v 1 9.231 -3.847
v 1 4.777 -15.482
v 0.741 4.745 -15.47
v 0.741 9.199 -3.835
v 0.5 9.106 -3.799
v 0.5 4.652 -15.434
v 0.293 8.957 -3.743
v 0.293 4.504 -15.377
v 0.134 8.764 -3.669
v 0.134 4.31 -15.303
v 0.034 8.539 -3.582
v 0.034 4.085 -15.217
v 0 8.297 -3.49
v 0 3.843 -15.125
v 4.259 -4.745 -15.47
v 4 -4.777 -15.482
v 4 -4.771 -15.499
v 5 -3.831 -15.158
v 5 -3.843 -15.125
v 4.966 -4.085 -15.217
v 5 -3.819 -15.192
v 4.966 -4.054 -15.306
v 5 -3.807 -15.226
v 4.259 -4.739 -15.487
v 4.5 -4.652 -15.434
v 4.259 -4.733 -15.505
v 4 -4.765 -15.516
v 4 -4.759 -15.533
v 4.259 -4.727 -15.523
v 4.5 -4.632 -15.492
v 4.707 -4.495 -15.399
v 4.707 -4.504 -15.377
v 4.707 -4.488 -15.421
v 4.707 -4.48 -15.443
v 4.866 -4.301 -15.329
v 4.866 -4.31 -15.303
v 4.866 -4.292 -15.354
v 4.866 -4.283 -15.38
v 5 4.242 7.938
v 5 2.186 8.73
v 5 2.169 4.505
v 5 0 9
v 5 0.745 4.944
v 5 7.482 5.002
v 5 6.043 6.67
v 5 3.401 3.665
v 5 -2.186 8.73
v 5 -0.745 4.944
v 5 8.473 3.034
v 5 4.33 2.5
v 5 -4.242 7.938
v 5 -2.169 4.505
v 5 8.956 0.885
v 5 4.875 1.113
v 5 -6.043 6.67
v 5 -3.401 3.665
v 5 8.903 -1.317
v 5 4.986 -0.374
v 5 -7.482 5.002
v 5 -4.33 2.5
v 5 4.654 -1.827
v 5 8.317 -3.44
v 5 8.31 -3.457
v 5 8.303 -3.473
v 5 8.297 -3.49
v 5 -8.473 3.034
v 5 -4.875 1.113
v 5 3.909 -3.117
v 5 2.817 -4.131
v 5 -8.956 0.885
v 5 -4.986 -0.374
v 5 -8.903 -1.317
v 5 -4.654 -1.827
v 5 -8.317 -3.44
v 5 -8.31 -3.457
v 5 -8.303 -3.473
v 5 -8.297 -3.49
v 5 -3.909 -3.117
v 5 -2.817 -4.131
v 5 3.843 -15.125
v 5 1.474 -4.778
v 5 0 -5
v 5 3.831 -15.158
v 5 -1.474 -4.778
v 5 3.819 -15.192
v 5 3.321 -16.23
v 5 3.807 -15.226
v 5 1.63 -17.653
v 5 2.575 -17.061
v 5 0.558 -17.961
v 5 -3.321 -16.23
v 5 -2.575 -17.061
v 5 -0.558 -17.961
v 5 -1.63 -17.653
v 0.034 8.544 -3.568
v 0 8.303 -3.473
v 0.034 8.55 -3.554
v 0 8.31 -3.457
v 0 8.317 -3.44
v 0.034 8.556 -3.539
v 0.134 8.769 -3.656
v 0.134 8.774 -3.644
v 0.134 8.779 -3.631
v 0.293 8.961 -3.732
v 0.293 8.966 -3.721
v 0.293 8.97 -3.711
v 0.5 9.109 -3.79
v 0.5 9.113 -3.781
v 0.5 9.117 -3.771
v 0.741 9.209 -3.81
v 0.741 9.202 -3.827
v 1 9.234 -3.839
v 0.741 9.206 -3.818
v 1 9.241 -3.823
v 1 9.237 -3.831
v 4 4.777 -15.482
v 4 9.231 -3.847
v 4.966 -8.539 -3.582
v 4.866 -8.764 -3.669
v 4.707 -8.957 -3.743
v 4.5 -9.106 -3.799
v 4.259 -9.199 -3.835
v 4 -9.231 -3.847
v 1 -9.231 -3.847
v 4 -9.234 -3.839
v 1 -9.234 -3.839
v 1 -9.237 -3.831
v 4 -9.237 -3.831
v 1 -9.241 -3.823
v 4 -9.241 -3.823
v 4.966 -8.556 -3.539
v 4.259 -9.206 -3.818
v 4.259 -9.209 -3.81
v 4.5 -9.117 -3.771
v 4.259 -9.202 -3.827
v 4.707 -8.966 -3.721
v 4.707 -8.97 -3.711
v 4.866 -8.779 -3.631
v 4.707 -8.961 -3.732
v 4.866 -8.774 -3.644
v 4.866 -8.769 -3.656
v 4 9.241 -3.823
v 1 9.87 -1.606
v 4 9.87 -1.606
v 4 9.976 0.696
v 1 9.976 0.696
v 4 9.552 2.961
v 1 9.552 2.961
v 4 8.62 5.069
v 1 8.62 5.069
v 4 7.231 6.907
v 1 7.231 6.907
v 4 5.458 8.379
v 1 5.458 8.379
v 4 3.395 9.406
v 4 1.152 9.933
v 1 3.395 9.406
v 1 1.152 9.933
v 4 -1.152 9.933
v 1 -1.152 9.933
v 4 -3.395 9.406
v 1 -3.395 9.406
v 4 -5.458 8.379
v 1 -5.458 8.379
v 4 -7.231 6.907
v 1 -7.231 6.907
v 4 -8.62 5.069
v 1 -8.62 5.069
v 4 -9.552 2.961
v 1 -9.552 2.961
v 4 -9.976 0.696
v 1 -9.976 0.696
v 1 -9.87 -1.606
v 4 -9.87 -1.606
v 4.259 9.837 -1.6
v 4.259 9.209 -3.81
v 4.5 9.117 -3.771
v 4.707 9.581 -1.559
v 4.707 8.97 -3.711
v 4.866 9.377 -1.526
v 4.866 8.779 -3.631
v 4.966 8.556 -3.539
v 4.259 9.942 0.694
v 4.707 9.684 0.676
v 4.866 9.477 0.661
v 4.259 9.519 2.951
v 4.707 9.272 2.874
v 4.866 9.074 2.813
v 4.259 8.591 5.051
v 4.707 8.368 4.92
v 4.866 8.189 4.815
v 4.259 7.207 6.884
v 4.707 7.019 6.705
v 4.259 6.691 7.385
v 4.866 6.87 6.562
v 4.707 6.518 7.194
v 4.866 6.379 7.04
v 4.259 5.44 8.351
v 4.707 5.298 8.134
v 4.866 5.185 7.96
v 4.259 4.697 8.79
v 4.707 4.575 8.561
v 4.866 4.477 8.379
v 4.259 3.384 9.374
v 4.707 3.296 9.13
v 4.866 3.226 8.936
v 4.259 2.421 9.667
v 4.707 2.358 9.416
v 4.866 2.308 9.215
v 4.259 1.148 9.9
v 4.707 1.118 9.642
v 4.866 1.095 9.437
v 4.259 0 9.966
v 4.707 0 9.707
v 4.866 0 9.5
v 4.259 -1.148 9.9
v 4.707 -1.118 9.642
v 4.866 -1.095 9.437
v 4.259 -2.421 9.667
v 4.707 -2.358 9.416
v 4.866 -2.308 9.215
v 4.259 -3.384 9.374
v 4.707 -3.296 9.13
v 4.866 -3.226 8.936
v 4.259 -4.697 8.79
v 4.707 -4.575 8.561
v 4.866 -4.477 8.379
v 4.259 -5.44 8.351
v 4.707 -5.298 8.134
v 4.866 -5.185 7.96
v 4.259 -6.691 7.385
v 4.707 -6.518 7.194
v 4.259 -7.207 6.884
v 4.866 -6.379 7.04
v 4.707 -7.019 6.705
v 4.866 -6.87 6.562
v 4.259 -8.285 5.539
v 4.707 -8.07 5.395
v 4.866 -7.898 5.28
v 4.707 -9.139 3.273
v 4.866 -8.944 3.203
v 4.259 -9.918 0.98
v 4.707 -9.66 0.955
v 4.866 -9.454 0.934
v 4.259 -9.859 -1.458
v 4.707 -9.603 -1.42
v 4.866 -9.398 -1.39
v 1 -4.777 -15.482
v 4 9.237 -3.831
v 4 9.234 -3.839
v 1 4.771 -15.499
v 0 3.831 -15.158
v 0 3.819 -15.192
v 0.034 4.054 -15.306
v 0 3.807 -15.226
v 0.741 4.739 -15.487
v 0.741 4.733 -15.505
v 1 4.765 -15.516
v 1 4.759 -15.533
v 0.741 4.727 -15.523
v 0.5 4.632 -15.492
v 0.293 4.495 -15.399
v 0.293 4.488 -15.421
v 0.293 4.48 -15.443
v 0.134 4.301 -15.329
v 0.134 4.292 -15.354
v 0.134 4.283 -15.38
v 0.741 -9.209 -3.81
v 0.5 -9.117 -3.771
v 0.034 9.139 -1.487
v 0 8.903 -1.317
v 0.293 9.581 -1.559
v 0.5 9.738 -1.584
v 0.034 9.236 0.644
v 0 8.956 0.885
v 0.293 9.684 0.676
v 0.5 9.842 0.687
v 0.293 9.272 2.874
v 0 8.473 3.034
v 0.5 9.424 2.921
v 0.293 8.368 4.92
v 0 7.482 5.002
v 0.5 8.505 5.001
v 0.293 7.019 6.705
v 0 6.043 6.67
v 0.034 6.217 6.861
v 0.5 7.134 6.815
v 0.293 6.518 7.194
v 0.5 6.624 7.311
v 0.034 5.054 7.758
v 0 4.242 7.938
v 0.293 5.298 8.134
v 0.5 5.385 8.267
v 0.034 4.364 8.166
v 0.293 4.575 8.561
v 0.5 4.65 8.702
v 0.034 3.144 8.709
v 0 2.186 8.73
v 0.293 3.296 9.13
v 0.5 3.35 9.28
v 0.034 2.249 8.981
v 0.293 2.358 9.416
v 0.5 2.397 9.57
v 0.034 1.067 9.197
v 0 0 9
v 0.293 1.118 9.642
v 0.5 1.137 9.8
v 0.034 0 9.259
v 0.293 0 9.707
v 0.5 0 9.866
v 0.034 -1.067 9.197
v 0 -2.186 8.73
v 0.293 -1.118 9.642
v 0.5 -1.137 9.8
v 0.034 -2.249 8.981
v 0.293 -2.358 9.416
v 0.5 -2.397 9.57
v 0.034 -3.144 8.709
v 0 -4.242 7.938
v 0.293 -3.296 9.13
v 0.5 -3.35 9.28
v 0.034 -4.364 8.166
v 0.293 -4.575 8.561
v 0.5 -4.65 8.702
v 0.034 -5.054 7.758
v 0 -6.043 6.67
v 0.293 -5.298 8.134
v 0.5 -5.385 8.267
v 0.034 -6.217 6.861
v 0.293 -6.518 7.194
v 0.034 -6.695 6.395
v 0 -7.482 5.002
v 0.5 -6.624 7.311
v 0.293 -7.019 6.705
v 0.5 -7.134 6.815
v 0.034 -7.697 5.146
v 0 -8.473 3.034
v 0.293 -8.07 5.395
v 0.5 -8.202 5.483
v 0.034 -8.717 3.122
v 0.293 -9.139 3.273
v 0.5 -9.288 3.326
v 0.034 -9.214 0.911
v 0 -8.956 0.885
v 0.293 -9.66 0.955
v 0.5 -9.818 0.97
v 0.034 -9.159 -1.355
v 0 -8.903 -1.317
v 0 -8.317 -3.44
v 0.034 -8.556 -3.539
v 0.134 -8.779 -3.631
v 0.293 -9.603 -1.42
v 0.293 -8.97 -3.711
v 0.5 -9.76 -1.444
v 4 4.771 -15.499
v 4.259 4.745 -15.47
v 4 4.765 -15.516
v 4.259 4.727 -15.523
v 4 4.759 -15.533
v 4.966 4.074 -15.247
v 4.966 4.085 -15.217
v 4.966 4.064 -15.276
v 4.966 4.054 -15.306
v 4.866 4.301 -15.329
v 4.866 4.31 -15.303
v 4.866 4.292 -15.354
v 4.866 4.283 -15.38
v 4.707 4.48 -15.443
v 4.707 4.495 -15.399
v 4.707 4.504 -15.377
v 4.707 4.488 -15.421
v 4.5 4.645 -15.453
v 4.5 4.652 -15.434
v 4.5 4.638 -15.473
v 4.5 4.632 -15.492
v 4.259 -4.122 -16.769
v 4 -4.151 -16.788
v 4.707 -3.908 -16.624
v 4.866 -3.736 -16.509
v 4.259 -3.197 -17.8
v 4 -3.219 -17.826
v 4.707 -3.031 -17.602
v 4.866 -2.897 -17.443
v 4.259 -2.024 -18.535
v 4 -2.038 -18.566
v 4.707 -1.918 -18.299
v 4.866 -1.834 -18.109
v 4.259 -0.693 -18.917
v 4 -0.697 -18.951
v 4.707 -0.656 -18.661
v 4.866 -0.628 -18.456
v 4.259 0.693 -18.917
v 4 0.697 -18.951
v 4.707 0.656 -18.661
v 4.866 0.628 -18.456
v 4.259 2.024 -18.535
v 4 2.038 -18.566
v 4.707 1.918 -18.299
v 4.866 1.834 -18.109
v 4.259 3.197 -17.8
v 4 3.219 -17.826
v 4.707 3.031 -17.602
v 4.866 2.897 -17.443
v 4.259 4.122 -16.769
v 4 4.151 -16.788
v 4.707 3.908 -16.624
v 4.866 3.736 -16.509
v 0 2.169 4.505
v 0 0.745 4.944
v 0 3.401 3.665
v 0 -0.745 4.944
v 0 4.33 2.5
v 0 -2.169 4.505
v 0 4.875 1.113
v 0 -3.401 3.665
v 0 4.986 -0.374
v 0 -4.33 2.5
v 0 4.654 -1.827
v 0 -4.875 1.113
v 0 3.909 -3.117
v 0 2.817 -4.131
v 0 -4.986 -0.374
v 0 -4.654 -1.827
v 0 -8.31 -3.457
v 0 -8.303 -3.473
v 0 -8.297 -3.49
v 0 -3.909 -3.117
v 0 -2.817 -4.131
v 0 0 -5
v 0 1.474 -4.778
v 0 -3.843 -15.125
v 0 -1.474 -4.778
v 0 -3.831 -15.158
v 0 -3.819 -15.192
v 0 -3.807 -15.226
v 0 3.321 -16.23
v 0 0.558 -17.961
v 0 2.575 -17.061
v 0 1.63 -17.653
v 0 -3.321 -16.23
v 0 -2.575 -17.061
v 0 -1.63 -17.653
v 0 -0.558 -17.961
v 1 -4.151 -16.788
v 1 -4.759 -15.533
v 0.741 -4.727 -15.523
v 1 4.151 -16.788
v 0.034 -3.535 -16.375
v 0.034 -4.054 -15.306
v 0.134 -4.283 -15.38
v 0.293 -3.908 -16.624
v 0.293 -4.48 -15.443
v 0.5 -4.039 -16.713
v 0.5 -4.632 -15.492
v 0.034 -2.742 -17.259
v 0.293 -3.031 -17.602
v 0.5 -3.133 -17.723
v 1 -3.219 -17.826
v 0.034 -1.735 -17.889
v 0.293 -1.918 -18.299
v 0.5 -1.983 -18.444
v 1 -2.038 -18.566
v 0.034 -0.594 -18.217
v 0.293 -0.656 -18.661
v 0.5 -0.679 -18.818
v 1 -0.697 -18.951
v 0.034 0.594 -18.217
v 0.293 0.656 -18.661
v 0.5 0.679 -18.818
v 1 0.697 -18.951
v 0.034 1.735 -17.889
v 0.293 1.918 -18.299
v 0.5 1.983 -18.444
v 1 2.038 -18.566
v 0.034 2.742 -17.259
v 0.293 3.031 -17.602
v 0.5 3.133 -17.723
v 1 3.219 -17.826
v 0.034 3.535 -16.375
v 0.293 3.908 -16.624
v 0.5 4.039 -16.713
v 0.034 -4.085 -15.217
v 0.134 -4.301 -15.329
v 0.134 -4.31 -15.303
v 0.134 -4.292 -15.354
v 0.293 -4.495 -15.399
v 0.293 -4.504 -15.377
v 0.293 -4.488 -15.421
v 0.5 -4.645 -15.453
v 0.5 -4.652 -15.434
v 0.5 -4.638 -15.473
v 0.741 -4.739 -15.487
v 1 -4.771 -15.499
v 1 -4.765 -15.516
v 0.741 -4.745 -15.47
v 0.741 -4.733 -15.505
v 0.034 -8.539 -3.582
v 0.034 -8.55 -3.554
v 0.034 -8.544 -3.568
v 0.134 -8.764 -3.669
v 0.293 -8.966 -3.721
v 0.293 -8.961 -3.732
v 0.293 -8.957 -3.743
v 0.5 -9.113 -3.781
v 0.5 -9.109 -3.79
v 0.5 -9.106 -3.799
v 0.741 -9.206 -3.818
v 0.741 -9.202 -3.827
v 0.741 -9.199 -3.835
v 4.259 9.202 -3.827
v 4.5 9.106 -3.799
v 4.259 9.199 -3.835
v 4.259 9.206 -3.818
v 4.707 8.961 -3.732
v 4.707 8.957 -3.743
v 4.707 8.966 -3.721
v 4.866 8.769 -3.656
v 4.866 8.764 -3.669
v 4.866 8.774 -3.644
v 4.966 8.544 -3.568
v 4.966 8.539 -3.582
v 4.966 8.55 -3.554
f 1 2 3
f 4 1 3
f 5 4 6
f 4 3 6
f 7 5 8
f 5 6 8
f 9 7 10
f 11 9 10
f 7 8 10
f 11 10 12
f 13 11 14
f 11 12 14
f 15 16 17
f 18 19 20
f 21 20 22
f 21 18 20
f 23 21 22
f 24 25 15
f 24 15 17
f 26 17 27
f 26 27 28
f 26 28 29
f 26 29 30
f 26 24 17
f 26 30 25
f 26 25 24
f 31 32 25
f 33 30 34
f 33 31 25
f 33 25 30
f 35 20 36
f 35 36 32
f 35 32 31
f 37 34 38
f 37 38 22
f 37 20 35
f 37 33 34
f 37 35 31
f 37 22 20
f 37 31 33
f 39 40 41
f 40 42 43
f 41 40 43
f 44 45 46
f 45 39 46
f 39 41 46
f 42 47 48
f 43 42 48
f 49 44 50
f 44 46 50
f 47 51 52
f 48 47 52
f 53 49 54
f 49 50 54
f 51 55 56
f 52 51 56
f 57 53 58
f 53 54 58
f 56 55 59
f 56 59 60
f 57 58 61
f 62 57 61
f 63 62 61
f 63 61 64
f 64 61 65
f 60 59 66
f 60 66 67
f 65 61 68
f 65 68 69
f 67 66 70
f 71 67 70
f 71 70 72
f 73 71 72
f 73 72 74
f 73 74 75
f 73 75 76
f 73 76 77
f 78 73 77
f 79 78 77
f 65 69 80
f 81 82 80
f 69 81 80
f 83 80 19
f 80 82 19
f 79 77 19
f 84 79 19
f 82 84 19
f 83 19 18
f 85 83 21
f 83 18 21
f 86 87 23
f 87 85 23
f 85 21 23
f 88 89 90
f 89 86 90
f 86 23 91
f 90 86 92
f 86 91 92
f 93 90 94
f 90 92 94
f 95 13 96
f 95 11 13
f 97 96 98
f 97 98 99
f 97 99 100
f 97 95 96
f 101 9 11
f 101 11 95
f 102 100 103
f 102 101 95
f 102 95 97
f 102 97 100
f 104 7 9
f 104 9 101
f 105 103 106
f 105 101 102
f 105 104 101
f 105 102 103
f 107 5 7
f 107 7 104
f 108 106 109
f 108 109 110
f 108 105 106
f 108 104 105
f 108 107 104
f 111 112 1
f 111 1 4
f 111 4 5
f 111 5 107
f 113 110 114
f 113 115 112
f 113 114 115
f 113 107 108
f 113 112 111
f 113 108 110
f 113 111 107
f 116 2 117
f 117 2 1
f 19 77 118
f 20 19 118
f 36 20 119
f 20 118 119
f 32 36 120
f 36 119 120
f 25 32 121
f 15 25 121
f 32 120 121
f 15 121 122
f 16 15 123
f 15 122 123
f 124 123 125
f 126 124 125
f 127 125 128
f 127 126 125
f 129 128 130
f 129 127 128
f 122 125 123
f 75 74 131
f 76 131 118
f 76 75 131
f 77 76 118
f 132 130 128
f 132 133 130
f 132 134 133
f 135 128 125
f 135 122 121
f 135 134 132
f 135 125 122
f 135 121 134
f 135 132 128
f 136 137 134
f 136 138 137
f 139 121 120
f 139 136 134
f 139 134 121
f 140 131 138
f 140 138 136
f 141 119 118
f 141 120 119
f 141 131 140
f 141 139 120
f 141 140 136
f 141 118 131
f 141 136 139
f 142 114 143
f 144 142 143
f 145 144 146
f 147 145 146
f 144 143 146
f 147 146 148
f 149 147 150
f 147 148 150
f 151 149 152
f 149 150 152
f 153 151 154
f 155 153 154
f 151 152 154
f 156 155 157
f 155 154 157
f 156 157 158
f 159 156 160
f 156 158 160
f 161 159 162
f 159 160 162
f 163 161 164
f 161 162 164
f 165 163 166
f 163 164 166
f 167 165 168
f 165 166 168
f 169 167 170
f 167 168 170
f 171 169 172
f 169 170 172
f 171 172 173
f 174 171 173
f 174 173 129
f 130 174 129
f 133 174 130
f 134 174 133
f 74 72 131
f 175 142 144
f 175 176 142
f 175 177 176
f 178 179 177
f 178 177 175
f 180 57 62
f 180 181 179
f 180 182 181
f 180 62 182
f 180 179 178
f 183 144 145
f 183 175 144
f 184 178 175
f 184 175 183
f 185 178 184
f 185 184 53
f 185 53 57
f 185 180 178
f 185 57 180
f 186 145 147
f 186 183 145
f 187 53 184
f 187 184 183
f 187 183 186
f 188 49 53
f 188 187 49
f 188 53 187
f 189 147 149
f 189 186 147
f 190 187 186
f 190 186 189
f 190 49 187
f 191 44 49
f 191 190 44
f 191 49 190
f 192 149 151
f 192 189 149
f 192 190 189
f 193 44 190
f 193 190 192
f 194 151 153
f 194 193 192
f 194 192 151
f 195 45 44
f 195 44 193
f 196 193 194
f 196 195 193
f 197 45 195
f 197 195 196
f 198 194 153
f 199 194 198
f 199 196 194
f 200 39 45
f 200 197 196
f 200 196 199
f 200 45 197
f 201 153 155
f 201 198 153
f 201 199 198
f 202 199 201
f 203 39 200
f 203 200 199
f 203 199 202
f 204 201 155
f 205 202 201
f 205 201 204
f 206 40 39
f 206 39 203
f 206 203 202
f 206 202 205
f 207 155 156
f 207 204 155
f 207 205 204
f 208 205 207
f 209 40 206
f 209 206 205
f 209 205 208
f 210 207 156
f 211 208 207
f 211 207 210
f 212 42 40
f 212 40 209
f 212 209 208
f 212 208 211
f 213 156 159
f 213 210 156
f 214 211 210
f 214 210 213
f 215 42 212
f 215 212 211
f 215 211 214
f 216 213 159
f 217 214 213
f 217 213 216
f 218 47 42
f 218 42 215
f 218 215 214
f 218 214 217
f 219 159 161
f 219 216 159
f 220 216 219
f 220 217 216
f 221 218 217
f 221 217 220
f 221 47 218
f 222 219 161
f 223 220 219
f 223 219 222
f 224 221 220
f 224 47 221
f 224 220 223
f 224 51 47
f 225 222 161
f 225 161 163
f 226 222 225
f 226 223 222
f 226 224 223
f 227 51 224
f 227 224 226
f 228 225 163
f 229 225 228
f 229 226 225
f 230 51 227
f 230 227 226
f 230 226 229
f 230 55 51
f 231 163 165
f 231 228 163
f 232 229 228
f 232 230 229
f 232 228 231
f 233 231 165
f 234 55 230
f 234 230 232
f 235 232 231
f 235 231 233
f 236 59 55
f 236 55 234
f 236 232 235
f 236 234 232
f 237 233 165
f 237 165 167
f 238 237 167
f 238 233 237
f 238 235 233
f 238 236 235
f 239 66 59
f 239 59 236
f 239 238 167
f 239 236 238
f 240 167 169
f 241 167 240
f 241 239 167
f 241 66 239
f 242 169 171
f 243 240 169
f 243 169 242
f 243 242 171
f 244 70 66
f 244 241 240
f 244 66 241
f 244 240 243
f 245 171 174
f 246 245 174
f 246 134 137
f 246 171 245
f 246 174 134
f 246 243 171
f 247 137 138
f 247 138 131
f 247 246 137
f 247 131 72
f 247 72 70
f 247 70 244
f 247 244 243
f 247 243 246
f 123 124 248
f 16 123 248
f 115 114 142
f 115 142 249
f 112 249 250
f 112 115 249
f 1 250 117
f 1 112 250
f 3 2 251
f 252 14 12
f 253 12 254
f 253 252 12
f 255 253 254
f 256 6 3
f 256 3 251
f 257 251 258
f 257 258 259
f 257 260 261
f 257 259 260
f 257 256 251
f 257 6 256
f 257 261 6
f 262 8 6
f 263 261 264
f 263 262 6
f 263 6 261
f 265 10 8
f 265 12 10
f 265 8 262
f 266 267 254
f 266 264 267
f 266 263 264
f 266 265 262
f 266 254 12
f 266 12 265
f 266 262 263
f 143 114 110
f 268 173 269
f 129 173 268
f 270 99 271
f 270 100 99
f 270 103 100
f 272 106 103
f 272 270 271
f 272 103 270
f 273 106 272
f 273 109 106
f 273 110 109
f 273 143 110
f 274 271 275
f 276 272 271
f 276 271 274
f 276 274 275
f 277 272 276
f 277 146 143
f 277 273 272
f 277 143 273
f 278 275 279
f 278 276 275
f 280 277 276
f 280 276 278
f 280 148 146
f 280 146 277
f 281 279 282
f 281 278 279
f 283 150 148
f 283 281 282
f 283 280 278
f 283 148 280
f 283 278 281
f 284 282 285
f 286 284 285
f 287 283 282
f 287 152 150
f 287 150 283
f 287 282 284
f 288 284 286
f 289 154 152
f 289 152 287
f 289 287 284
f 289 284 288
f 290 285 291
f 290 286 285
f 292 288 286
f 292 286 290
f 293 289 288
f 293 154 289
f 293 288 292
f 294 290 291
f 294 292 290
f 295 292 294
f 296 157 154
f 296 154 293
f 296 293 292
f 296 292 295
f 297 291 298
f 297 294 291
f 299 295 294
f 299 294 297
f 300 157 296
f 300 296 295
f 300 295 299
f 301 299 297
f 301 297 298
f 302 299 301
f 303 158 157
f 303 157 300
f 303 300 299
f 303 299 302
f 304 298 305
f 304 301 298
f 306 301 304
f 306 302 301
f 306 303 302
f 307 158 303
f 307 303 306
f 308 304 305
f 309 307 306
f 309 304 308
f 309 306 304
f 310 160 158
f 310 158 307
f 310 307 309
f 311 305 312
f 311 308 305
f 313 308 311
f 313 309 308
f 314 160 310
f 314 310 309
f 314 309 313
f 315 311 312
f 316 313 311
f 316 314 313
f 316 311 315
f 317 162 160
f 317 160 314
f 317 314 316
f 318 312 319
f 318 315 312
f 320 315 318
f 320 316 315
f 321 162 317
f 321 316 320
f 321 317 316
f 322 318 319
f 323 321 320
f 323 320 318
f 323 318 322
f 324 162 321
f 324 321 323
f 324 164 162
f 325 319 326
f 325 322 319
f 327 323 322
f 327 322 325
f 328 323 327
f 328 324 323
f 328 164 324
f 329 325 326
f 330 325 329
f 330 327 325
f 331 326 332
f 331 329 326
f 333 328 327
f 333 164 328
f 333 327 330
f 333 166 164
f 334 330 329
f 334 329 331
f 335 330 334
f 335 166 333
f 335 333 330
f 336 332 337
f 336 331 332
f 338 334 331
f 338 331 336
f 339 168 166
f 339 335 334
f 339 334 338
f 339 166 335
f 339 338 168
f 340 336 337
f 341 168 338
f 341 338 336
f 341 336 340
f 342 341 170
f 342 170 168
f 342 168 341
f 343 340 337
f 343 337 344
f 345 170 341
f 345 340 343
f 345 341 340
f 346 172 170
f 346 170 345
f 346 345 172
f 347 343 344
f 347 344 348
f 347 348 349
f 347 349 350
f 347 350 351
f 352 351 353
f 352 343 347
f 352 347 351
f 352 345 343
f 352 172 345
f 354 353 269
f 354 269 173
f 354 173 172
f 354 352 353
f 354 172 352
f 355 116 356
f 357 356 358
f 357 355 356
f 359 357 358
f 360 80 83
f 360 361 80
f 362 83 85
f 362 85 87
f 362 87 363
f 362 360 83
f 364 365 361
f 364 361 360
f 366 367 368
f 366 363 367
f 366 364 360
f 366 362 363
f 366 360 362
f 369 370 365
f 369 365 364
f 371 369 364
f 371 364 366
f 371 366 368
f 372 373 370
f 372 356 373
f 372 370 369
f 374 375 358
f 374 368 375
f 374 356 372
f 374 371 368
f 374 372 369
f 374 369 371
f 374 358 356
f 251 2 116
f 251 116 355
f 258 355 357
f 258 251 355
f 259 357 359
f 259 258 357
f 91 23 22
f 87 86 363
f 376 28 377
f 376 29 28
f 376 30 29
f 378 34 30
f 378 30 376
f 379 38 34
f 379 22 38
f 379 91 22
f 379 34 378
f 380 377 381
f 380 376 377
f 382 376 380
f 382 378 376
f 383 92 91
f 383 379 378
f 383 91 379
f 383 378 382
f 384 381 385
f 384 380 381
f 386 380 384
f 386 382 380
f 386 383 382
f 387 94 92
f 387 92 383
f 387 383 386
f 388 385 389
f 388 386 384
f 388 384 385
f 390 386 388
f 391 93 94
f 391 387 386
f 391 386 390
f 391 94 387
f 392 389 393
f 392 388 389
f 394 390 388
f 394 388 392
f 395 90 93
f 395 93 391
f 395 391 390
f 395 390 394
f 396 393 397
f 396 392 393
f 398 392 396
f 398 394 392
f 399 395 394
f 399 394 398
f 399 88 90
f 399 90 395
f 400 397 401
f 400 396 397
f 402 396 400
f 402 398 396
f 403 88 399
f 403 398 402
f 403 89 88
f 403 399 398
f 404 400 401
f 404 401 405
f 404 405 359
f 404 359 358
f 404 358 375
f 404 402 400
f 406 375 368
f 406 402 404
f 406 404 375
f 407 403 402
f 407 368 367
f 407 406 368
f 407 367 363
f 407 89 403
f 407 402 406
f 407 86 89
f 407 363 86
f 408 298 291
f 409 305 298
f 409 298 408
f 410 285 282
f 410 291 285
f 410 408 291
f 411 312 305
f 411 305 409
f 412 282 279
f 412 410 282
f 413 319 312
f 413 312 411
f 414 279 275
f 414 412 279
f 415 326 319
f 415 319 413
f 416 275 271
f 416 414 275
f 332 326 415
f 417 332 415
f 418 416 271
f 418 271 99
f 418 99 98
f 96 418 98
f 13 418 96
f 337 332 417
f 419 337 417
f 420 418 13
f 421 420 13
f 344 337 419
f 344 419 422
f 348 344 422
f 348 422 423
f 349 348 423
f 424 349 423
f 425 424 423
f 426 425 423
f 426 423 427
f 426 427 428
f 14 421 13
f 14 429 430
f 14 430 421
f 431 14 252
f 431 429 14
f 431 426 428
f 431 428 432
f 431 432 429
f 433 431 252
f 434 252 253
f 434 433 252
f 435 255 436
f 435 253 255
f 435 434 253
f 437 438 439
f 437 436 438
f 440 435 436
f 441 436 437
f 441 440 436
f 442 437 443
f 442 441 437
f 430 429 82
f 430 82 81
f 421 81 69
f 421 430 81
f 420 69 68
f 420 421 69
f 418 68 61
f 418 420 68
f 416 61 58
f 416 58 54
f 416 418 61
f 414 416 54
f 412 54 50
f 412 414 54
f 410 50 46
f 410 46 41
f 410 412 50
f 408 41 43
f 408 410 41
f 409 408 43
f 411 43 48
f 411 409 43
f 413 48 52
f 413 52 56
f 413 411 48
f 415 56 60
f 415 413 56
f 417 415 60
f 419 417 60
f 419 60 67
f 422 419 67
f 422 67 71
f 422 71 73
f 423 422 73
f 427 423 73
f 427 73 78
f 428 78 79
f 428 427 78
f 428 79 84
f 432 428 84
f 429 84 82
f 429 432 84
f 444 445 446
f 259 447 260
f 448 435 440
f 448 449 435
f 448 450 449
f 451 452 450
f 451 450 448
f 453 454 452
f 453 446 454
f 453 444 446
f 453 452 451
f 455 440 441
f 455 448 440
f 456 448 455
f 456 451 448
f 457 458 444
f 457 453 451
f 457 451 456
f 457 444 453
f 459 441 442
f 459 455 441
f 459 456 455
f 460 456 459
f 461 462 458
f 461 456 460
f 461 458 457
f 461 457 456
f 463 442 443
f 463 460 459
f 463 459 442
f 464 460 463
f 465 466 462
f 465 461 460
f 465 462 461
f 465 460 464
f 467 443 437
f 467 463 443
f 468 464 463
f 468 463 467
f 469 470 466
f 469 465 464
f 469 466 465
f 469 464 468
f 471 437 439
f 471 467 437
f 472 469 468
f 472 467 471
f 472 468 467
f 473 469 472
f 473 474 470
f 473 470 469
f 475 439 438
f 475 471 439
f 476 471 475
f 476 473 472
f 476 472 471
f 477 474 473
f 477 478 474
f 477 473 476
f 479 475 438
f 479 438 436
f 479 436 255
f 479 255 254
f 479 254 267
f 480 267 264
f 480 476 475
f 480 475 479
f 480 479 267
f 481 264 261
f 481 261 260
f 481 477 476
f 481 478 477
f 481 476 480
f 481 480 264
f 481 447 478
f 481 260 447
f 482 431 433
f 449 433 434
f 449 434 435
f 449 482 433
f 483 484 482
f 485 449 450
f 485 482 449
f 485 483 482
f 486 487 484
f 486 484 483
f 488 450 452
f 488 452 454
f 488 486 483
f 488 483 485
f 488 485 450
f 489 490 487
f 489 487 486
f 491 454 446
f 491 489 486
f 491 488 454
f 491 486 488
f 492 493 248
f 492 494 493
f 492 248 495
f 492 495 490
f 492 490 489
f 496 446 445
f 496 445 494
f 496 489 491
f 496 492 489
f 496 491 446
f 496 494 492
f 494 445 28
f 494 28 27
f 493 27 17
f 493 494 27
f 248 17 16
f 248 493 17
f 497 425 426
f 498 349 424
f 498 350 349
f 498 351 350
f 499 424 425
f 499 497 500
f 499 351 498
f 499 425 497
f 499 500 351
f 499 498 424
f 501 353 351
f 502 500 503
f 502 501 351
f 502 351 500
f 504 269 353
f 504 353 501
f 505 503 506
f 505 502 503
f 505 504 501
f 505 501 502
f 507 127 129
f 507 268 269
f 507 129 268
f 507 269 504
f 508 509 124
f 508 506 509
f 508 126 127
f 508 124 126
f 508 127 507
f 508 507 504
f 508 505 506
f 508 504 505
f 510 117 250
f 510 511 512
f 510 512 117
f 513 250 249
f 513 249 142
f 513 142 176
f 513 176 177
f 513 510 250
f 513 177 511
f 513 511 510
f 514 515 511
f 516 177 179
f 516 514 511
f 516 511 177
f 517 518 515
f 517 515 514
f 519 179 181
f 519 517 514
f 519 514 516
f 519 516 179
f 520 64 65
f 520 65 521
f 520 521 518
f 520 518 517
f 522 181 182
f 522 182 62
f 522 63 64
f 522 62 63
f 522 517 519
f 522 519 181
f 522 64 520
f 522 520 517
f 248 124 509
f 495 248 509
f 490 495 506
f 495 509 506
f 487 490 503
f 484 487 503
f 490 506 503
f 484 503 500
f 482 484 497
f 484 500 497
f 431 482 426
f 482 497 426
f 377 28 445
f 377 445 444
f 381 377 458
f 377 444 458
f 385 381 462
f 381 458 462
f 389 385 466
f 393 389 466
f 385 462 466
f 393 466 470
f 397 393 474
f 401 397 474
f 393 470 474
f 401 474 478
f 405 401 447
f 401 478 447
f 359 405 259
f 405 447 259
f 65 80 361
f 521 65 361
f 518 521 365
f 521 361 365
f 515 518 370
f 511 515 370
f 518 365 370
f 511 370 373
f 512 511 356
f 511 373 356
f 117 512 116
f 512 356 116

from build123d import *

# Parameters (mm, degrees)
SKETCH1_R           = 5
BOSS_EXTRUDE1_DEPTH = 5
FILLET2_R           = 1


with BuildPart() as part:
    # Sketch1 → Boss-Extrude1 (new body)
    with BuildSketch(Plane(origin=(0, 0, 0), x_dir=(0, 0, -1), z_dir=(1, 0, 0))):
        with BuildLine():
            Line((3.834545484, -9.235597487), (15.508521108, -4.767007874))
            ThreePointArc((15.508521108, -4.767007874), (19, 0), (15.508521108, 4.767007874))
            Line((15.508521108, 4.767007874), (3.834545484, 9.235597487))
            ThreePointArc((3.834545484, 9.235597487), (-10, 0), (3.834545484, -9.235597487))
        make_face()
        Circle(SKETCH1_R, mode=Mode.SUBTRACT)
    extrude(amount=BOSS_EXTRUDE1_DEPTH)

    # Fillet2
    # the kernel refuses this fillet: 1 mm, written as the material it adds along each edge
    with BuildSketch(Plane(origin=(0, -9.235597487, -3.834545484), x_dir=(0, -0.3828536121528857, 0.9238090233708955), z_dir=(1, 0, 0))) as fillet2_piece_1:
        with BuildLine():
            CenterArc((0.013662307, 0.999999788), FILLET2_R, 268.43540008, 1.527324084)
            Line((-0.01364172, 0.000372613), (0, 0))
            ThreePointArc((0, 0), (0.00650586, 2.116e-06), (0.013011721, 0))
        make_face()
    extrude(amount=5)
    with BuildSketch(Plane(origin=(0, 9.235597487, -3.834545484), x_dir=(0, -0.35748716903167743, -0.9339180499260719), z_dir=(1, 0, 0))) as fillet2_piece_2:
        with BuildLine():
            CenterArc((0.013646808, 1), FILLET2_R, 268.472675916, 1.527324084)
            ThreePointArc((-0.013006869, 0.000355272), (-0.006503377, 0.000179752), (0, 0))
            Line((0, 0), (0.013646808, 0))
        make_face()
    extrude(amount=5)
    with BuildSketch(Plane(origin=(0, 4.767007874, -15.508521108), x_dir=(0, 0.3574871690316874, 0.9339180499260681), z_dir=(1, 0, 0))) as fillet2_piece_3:
        with BuildLine():
            CenterArc((0.028209357, -1), FILLET2_R, 90, 3.090872231)
            ThreePointArc((-0.025710379, -0.001454727), (-0.012854253, -0.000743916), (0, 0))
            Line((0, 0), (0.028209357, 0))
        make_face()
    extrude(amount=5)
    with BuildSketch(Plane(origin=(0, -4.767007874, -15.508521108), x_dir=(0, -0.3574871690316535, 0.933918049926081), z_dir=(1, 0, 0))) as fillet2_piece_4:
        with BuildLine():
            CenterArc((0.028209357, 1), FILLET2_R, 266.909127769, 3.090872231)
            ThreePointArc((-0.025710379, 0.001454727), (-0.012854253, 0.000743916), (0, 0))
            Line((0, 0), (0.028209357, 0))
        make_face()
    extrude(amount=5)
    # the kernel refuses this fillet: 1 mm, written as the material it takes off along each edge
    with BuildSketch(Plane(origin=(5, 0, -14), x_dir=(0, -0.9518350677637516, -0.3066105082595415), z_dir=(0, -0.3066105082595415, 0.9518350677637516))) as fillet2_2_piece_1:
        with BuildLine():
            CenterArc((5 - FILLET2_R, -FILLET2_R), FILLET2_R, 0, 90)
            Line((5, -FILLET2_R), (5, 0))
            Line((5, 0), (5 - FILLET2_R, 0))
        make_face()
    revolve(axis=Axis((5, 0, -14), (1, 0, 0)), revolution_arc=144.289835586, mode=Mode.SUBTRACT)
    with BuildSketch(Plane(origin=(5, 4.777092357, -15.482175881), x_dir=(-1, 0, 0), z_dir=(0, 0.3574871690316615, 0.933918049926078)), Plane(origin=(0, -9.230718928, -3.847290484), x_dir=(0, 0.9339180499260781, 0.35748716903166156), z_dir=(0, 0.3574871690316615, -0.933918049926078))) as fillet2_2_piece_2:
        with BuildLine():
            CenterArc((FILLET2_R, FILLET2_R), FILLET2_R, 180, 90)
            Line((0, FILLET2_R), (0, 0))
            Line((0, 0), (FILLET2_R, 0))
        make_face()
    extrude(amount=12.458143836, mode=Mode.SUBTRACT)
    with BuildSketch(Plane(origin=(5, 0, 0), x_dir=(0, 0.9240579070749063, -0.38225251388623166), z_dir=(0, -0.38225251388623166, -0.9240579070749063))) as fillet2_2_piece_3:
        with BuildLine():
            CenterArc((10 - FILLET2_R, -FILLET2_R), FILLET2_R, 0, 90)
            Line((10, -FILLET2_R), (10, 0))
            Line((10, 0), (10 - FILLET2_R, 0))
        make_face()
    revolve(axis=Axis((5, 0, 0), (1, 0, 0)), revolution_arc=224.946557044, mode=Mode.SUBTRACT)
    with BuildSketch(Plane(origin=(5, -9.230718928, -3.847290484), x_dir=(0, 0.9339180499260781, 0.35748716903166156), z_dir=(0, 0.3574871690316615, -0.933918049926078)), Plane(origin=(0, 4.777092357, -15.482175881), x_dir=(1, 0, 0), z_dir=(0, 0.3574871690316615, 0.933918049926078))) as fillet2_2_piece_4:
        with BuildLine():
            CenterArc((FILLET2_R, -FILLET2_R), FILLET2_R, 90, 90)
            Line((0, -FILLET2_R), (0, 0))
            Line((0, 0), (FILLET2_R, 0))
        make_face()
    extrude(amount=12.458143836, mode=Mode.SUBTRACT)
    with BuildSketch(Plane(origin=(0, 0, 0), x_dir=(0, 0.9240579070749063, -0.38225251388623166), z_dir=(0, -0.38225251388623166, -0.9240579070749063))) as fillet2_2_piece_5:
        with BuildLine():
            CenterArc((10 - FILLET2_R, FILLET2_R), FILLET2_R, 270, 90)
            Line((10, FILLET2_R), (10, 0))
            Line((10, 0), (10 - FILLET2_R, 0))
        make_face()
    revolve(axis=Axis((0, 0, 0), (1, 0, 0)), revolution_arc=224.946557044, mode=Mode.SUBTRACT)
    with BuildSketch(Plane(origin=(0, 0, -14), x_dir=(0, -0.9518350677637516, -0.3066105082595415), z_dir=(0, -0.3066105082595415, 0.9518350677637516))) as fillet2_2_piece_6:
        with BuildLine():
            CenterArc((5 - FILLET2_R, FILLET2_R), FILLET2_R, 270, 90)
            Line((5, FILLET2_R), (5, 0))
            Line((5, 0), (5 - FILLET2_R, 0))
        make_face()
    revolve(axis=Axis((0, 0, -14), (1, 0, 0)), revolution_arc=144.289835586, mode=Mode.SUBTRACT)
    with BuildSketch(Plane(origin=(0, -10.164636978, -4.204777653), x_dir=(0, 0.9240579070749084, 0.38225251388622655), z_dir=(0, -0.38225251388622655, 0.9240579070749084))) as fillet2_2_piece_7:
        with BuildLine():
            CenterArc((1 + FILLET2_R, -FILLET2_R), FILLET2_R, 90, 90)
            Line((1, -FILLET2_R), (1, 0))
            Line((1, 0), (1 + FILLET2_R, 0))
        make_face()
    revolve(axis=Axis((0, -10.164636978, -4.204777653), (-1, 0, 0)), revolution_arc=1.527324084, mode=Mode.SUBTRACT)
    with BuildSketch(Plane(origin=(0, -5.711010407, -15.83966305), x_dir=(0, 0.9339180499260777, 0.35748716903166233), z_dir=(0, -0.35748716903166233, 0.9339180499260777))) as fillet2_2_piece_8:
        with BuildLine():
            CenterArc((1 + FILLET2_R, -FILLET2_R), FILLET2_R, 90, 90)
            Line((1, -FILLET2_R), (1, 0))
            Line((1, 0), (1 + FILLET2_R, 0))
        make_face()
    revolve(axis=Axis((0, -5.711010407, -15.83966305), (-1, 0, 0)), revolution_arc=3.090872231, mode=Mode.SUBTRACT)
    with BuildSketch(Plane(origin=(0, 5.711010407, -15.83966305), x_dir=(0, -0.9339180499260777, 0.35748716903166233), z_dir=(0, 0.35748716903166233, 0.9339180499260777))) as fillet2_2_piece_9:
        with BuildLine():
            CenterArc((1 + FILLET2_R, FILLET2_R), FILLET2_R, 180, 90)
            Line((1, FILLET2_R), (1, 0))
            Line((1, 0), (1 + FILLET2_R, 0))
        make_face()
    revolve(axis=Axis((0, 5.711010407, -15.83966305), (1, 0, 0)), revolution_arc=3.090872231, mode=Mode.SUBTRACT)
    with BuildSketch(Plane(origin=(0, 10.164636978, -4.204777653), x_dir=(0, -0.9339180499260781, 0.35748716903166156), z_dir=(0, -0.35748716903166156, -0.9339180499260781))) as fillet2_2_piece_10:
        with BuildLine():
            CenterArc((1 + FILLET2_R, -FILLET2_R), FILLET2_R, 90, 90)
            Line((1, -FILLET2_R), (1, 0))
            Line((1, 0), (1 + FILLET2_R, 0))
        make_face()
    revolve(axis=Axis((0, 10.164636978, -4.204777653), (-1, 0, 0)), revolution_arc=1.527324084, mode=Mode.SUBTRACT)
    with BuildSketch(Plane(origin=(5, -10.164636978, -4.204777653), x_dir=(0, 0.9240579070749084, 0.38225251388622655), z_dir=(0, -0.38225251388622655, 0.9240579070749084))) as fillet2_2_piece_11:
        with BuildLine():
            CenterArc((1 + FILLET2_R, FILLET2_R), FILLET2_R, 180, 90)
            Line((1, FILLET2_R), (1, 0))
            Line((1, 0), (1 + FILLET2_R, 0))
        make_face()
    revolve(axis=Axis((5, -10.164636978, -4.204777653), (-1, 0, 0)), revolution_arc=1.527324084, mode=Mode.SUBTRACT)
    with BuildSketch(Plane(origin=(5, -5.711010407, -15.83966305), x_dir=(0, 0.9339180499260777, 0.35748716903166233), z_dir=(0, -0.35748716903166233, 0.9339180499260777))) as fillet2_2_piece_12:
        with BuildLine():
            CenterArc((1 + FILLET2_R, FILLET2_R), FILLET2_R, 180, 90)
            Line((1, FILLET2_R), (1, 0))
            Line((1, 0), (1 + FILLET2_R, 0))
        make_face()
    revolve(axis=Axis((5, -5.711010407, -15.83966305), (-1, 0, 0)), revolution_arc=3.090872231, mode=Mode.SUBTRACT)
    with BuildSketch(Plane(origin=(5, 10.164636978, -4.204777653), x_dir=(0, -0.9339180499260781, 0.35748716903166156), z_dir=(0, -0.35748716903166156, -0.9339180499260781))) as fillet2_2_piece_13:
        with BuildLine():
            CenterArc((1 + FILLET2_R, FILLET2_R), FILLET2_R, 180, 90)
            Line((1 + FILLET2_R, 0), (1, 0))
            Line((1, 0), (1, FILLET2_R))
        make_face()
    revolve(axis=Axis((5, 10.164636978, -4.204777653), (-1, 0, 0)), revolution_arc=1.527324084, mode=Mode.SUBTRACT)
    with BuildSketch(Plane(origin=(5, 5.711010407, -15.83966305), x_dir=(0, -0.9339180499260777, 0.35748716903166233), z_dir=(0, 0.35748716903166233, 0.9339180499260777))) as fillet2_2_piece_14:
        with BuildLine():
            CenterArc((1 + FILLET2_R, -FILLET2_R), FILLET2_R, 90, 90)
            Line((1, -FILLET2_R), (1, 0))
            Line((1, 0), (1 + FILLET2_R, 0))
        make_face()
    revolve(axis=Axis((5, 5.711010407, -15.83966305), (1, 0, 0)), revolution_arc=3.090872231, mode=Mode.SUBTRACT)


solid = part.part
